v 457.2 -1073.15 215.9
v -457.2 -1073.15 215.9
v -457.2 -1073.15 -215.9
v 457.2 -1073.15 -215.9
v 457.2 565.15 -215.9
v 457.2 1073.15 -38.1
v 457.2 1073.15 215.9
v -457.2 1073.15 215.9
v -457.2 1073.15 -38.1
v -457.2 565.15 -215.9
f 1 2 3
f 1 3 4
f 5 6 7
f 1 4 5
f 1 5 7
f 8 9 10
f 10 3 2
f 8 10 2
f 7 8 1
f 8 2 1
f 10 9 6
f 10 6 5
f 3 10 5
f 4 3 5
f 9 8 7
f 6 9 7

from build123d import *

# Parameters (mm, degrees)
F0_W     = 914.4
F0_H     = 431.8
F1_DEPTH = 1073.15
F3_DEPTH = 914.401


# Not quite as in the source:
# - a feature names something its author has since deleted; it is built from what else it names


with BuildPart() as f1:
    # F0 (on Front) → F1 (new body, symmetric)
    with BuildSketch(Plane.XZ):
        Rectangle(F0_W, F0_H)
    extrude(amount=F1_DEPTH, both=True)

    # F2 (on face) → F3 (cut, through all)
    with BuildSketch(Plane.YZ.offset(457.2)):
        Polygon((1073.15, -215.9), (1073.15, -38.1), (565.15, -215.9), align=None)
    extrude(amount=-F3_DEPTH, mode=Mode.SUBTRACT)


solid = f1.part
